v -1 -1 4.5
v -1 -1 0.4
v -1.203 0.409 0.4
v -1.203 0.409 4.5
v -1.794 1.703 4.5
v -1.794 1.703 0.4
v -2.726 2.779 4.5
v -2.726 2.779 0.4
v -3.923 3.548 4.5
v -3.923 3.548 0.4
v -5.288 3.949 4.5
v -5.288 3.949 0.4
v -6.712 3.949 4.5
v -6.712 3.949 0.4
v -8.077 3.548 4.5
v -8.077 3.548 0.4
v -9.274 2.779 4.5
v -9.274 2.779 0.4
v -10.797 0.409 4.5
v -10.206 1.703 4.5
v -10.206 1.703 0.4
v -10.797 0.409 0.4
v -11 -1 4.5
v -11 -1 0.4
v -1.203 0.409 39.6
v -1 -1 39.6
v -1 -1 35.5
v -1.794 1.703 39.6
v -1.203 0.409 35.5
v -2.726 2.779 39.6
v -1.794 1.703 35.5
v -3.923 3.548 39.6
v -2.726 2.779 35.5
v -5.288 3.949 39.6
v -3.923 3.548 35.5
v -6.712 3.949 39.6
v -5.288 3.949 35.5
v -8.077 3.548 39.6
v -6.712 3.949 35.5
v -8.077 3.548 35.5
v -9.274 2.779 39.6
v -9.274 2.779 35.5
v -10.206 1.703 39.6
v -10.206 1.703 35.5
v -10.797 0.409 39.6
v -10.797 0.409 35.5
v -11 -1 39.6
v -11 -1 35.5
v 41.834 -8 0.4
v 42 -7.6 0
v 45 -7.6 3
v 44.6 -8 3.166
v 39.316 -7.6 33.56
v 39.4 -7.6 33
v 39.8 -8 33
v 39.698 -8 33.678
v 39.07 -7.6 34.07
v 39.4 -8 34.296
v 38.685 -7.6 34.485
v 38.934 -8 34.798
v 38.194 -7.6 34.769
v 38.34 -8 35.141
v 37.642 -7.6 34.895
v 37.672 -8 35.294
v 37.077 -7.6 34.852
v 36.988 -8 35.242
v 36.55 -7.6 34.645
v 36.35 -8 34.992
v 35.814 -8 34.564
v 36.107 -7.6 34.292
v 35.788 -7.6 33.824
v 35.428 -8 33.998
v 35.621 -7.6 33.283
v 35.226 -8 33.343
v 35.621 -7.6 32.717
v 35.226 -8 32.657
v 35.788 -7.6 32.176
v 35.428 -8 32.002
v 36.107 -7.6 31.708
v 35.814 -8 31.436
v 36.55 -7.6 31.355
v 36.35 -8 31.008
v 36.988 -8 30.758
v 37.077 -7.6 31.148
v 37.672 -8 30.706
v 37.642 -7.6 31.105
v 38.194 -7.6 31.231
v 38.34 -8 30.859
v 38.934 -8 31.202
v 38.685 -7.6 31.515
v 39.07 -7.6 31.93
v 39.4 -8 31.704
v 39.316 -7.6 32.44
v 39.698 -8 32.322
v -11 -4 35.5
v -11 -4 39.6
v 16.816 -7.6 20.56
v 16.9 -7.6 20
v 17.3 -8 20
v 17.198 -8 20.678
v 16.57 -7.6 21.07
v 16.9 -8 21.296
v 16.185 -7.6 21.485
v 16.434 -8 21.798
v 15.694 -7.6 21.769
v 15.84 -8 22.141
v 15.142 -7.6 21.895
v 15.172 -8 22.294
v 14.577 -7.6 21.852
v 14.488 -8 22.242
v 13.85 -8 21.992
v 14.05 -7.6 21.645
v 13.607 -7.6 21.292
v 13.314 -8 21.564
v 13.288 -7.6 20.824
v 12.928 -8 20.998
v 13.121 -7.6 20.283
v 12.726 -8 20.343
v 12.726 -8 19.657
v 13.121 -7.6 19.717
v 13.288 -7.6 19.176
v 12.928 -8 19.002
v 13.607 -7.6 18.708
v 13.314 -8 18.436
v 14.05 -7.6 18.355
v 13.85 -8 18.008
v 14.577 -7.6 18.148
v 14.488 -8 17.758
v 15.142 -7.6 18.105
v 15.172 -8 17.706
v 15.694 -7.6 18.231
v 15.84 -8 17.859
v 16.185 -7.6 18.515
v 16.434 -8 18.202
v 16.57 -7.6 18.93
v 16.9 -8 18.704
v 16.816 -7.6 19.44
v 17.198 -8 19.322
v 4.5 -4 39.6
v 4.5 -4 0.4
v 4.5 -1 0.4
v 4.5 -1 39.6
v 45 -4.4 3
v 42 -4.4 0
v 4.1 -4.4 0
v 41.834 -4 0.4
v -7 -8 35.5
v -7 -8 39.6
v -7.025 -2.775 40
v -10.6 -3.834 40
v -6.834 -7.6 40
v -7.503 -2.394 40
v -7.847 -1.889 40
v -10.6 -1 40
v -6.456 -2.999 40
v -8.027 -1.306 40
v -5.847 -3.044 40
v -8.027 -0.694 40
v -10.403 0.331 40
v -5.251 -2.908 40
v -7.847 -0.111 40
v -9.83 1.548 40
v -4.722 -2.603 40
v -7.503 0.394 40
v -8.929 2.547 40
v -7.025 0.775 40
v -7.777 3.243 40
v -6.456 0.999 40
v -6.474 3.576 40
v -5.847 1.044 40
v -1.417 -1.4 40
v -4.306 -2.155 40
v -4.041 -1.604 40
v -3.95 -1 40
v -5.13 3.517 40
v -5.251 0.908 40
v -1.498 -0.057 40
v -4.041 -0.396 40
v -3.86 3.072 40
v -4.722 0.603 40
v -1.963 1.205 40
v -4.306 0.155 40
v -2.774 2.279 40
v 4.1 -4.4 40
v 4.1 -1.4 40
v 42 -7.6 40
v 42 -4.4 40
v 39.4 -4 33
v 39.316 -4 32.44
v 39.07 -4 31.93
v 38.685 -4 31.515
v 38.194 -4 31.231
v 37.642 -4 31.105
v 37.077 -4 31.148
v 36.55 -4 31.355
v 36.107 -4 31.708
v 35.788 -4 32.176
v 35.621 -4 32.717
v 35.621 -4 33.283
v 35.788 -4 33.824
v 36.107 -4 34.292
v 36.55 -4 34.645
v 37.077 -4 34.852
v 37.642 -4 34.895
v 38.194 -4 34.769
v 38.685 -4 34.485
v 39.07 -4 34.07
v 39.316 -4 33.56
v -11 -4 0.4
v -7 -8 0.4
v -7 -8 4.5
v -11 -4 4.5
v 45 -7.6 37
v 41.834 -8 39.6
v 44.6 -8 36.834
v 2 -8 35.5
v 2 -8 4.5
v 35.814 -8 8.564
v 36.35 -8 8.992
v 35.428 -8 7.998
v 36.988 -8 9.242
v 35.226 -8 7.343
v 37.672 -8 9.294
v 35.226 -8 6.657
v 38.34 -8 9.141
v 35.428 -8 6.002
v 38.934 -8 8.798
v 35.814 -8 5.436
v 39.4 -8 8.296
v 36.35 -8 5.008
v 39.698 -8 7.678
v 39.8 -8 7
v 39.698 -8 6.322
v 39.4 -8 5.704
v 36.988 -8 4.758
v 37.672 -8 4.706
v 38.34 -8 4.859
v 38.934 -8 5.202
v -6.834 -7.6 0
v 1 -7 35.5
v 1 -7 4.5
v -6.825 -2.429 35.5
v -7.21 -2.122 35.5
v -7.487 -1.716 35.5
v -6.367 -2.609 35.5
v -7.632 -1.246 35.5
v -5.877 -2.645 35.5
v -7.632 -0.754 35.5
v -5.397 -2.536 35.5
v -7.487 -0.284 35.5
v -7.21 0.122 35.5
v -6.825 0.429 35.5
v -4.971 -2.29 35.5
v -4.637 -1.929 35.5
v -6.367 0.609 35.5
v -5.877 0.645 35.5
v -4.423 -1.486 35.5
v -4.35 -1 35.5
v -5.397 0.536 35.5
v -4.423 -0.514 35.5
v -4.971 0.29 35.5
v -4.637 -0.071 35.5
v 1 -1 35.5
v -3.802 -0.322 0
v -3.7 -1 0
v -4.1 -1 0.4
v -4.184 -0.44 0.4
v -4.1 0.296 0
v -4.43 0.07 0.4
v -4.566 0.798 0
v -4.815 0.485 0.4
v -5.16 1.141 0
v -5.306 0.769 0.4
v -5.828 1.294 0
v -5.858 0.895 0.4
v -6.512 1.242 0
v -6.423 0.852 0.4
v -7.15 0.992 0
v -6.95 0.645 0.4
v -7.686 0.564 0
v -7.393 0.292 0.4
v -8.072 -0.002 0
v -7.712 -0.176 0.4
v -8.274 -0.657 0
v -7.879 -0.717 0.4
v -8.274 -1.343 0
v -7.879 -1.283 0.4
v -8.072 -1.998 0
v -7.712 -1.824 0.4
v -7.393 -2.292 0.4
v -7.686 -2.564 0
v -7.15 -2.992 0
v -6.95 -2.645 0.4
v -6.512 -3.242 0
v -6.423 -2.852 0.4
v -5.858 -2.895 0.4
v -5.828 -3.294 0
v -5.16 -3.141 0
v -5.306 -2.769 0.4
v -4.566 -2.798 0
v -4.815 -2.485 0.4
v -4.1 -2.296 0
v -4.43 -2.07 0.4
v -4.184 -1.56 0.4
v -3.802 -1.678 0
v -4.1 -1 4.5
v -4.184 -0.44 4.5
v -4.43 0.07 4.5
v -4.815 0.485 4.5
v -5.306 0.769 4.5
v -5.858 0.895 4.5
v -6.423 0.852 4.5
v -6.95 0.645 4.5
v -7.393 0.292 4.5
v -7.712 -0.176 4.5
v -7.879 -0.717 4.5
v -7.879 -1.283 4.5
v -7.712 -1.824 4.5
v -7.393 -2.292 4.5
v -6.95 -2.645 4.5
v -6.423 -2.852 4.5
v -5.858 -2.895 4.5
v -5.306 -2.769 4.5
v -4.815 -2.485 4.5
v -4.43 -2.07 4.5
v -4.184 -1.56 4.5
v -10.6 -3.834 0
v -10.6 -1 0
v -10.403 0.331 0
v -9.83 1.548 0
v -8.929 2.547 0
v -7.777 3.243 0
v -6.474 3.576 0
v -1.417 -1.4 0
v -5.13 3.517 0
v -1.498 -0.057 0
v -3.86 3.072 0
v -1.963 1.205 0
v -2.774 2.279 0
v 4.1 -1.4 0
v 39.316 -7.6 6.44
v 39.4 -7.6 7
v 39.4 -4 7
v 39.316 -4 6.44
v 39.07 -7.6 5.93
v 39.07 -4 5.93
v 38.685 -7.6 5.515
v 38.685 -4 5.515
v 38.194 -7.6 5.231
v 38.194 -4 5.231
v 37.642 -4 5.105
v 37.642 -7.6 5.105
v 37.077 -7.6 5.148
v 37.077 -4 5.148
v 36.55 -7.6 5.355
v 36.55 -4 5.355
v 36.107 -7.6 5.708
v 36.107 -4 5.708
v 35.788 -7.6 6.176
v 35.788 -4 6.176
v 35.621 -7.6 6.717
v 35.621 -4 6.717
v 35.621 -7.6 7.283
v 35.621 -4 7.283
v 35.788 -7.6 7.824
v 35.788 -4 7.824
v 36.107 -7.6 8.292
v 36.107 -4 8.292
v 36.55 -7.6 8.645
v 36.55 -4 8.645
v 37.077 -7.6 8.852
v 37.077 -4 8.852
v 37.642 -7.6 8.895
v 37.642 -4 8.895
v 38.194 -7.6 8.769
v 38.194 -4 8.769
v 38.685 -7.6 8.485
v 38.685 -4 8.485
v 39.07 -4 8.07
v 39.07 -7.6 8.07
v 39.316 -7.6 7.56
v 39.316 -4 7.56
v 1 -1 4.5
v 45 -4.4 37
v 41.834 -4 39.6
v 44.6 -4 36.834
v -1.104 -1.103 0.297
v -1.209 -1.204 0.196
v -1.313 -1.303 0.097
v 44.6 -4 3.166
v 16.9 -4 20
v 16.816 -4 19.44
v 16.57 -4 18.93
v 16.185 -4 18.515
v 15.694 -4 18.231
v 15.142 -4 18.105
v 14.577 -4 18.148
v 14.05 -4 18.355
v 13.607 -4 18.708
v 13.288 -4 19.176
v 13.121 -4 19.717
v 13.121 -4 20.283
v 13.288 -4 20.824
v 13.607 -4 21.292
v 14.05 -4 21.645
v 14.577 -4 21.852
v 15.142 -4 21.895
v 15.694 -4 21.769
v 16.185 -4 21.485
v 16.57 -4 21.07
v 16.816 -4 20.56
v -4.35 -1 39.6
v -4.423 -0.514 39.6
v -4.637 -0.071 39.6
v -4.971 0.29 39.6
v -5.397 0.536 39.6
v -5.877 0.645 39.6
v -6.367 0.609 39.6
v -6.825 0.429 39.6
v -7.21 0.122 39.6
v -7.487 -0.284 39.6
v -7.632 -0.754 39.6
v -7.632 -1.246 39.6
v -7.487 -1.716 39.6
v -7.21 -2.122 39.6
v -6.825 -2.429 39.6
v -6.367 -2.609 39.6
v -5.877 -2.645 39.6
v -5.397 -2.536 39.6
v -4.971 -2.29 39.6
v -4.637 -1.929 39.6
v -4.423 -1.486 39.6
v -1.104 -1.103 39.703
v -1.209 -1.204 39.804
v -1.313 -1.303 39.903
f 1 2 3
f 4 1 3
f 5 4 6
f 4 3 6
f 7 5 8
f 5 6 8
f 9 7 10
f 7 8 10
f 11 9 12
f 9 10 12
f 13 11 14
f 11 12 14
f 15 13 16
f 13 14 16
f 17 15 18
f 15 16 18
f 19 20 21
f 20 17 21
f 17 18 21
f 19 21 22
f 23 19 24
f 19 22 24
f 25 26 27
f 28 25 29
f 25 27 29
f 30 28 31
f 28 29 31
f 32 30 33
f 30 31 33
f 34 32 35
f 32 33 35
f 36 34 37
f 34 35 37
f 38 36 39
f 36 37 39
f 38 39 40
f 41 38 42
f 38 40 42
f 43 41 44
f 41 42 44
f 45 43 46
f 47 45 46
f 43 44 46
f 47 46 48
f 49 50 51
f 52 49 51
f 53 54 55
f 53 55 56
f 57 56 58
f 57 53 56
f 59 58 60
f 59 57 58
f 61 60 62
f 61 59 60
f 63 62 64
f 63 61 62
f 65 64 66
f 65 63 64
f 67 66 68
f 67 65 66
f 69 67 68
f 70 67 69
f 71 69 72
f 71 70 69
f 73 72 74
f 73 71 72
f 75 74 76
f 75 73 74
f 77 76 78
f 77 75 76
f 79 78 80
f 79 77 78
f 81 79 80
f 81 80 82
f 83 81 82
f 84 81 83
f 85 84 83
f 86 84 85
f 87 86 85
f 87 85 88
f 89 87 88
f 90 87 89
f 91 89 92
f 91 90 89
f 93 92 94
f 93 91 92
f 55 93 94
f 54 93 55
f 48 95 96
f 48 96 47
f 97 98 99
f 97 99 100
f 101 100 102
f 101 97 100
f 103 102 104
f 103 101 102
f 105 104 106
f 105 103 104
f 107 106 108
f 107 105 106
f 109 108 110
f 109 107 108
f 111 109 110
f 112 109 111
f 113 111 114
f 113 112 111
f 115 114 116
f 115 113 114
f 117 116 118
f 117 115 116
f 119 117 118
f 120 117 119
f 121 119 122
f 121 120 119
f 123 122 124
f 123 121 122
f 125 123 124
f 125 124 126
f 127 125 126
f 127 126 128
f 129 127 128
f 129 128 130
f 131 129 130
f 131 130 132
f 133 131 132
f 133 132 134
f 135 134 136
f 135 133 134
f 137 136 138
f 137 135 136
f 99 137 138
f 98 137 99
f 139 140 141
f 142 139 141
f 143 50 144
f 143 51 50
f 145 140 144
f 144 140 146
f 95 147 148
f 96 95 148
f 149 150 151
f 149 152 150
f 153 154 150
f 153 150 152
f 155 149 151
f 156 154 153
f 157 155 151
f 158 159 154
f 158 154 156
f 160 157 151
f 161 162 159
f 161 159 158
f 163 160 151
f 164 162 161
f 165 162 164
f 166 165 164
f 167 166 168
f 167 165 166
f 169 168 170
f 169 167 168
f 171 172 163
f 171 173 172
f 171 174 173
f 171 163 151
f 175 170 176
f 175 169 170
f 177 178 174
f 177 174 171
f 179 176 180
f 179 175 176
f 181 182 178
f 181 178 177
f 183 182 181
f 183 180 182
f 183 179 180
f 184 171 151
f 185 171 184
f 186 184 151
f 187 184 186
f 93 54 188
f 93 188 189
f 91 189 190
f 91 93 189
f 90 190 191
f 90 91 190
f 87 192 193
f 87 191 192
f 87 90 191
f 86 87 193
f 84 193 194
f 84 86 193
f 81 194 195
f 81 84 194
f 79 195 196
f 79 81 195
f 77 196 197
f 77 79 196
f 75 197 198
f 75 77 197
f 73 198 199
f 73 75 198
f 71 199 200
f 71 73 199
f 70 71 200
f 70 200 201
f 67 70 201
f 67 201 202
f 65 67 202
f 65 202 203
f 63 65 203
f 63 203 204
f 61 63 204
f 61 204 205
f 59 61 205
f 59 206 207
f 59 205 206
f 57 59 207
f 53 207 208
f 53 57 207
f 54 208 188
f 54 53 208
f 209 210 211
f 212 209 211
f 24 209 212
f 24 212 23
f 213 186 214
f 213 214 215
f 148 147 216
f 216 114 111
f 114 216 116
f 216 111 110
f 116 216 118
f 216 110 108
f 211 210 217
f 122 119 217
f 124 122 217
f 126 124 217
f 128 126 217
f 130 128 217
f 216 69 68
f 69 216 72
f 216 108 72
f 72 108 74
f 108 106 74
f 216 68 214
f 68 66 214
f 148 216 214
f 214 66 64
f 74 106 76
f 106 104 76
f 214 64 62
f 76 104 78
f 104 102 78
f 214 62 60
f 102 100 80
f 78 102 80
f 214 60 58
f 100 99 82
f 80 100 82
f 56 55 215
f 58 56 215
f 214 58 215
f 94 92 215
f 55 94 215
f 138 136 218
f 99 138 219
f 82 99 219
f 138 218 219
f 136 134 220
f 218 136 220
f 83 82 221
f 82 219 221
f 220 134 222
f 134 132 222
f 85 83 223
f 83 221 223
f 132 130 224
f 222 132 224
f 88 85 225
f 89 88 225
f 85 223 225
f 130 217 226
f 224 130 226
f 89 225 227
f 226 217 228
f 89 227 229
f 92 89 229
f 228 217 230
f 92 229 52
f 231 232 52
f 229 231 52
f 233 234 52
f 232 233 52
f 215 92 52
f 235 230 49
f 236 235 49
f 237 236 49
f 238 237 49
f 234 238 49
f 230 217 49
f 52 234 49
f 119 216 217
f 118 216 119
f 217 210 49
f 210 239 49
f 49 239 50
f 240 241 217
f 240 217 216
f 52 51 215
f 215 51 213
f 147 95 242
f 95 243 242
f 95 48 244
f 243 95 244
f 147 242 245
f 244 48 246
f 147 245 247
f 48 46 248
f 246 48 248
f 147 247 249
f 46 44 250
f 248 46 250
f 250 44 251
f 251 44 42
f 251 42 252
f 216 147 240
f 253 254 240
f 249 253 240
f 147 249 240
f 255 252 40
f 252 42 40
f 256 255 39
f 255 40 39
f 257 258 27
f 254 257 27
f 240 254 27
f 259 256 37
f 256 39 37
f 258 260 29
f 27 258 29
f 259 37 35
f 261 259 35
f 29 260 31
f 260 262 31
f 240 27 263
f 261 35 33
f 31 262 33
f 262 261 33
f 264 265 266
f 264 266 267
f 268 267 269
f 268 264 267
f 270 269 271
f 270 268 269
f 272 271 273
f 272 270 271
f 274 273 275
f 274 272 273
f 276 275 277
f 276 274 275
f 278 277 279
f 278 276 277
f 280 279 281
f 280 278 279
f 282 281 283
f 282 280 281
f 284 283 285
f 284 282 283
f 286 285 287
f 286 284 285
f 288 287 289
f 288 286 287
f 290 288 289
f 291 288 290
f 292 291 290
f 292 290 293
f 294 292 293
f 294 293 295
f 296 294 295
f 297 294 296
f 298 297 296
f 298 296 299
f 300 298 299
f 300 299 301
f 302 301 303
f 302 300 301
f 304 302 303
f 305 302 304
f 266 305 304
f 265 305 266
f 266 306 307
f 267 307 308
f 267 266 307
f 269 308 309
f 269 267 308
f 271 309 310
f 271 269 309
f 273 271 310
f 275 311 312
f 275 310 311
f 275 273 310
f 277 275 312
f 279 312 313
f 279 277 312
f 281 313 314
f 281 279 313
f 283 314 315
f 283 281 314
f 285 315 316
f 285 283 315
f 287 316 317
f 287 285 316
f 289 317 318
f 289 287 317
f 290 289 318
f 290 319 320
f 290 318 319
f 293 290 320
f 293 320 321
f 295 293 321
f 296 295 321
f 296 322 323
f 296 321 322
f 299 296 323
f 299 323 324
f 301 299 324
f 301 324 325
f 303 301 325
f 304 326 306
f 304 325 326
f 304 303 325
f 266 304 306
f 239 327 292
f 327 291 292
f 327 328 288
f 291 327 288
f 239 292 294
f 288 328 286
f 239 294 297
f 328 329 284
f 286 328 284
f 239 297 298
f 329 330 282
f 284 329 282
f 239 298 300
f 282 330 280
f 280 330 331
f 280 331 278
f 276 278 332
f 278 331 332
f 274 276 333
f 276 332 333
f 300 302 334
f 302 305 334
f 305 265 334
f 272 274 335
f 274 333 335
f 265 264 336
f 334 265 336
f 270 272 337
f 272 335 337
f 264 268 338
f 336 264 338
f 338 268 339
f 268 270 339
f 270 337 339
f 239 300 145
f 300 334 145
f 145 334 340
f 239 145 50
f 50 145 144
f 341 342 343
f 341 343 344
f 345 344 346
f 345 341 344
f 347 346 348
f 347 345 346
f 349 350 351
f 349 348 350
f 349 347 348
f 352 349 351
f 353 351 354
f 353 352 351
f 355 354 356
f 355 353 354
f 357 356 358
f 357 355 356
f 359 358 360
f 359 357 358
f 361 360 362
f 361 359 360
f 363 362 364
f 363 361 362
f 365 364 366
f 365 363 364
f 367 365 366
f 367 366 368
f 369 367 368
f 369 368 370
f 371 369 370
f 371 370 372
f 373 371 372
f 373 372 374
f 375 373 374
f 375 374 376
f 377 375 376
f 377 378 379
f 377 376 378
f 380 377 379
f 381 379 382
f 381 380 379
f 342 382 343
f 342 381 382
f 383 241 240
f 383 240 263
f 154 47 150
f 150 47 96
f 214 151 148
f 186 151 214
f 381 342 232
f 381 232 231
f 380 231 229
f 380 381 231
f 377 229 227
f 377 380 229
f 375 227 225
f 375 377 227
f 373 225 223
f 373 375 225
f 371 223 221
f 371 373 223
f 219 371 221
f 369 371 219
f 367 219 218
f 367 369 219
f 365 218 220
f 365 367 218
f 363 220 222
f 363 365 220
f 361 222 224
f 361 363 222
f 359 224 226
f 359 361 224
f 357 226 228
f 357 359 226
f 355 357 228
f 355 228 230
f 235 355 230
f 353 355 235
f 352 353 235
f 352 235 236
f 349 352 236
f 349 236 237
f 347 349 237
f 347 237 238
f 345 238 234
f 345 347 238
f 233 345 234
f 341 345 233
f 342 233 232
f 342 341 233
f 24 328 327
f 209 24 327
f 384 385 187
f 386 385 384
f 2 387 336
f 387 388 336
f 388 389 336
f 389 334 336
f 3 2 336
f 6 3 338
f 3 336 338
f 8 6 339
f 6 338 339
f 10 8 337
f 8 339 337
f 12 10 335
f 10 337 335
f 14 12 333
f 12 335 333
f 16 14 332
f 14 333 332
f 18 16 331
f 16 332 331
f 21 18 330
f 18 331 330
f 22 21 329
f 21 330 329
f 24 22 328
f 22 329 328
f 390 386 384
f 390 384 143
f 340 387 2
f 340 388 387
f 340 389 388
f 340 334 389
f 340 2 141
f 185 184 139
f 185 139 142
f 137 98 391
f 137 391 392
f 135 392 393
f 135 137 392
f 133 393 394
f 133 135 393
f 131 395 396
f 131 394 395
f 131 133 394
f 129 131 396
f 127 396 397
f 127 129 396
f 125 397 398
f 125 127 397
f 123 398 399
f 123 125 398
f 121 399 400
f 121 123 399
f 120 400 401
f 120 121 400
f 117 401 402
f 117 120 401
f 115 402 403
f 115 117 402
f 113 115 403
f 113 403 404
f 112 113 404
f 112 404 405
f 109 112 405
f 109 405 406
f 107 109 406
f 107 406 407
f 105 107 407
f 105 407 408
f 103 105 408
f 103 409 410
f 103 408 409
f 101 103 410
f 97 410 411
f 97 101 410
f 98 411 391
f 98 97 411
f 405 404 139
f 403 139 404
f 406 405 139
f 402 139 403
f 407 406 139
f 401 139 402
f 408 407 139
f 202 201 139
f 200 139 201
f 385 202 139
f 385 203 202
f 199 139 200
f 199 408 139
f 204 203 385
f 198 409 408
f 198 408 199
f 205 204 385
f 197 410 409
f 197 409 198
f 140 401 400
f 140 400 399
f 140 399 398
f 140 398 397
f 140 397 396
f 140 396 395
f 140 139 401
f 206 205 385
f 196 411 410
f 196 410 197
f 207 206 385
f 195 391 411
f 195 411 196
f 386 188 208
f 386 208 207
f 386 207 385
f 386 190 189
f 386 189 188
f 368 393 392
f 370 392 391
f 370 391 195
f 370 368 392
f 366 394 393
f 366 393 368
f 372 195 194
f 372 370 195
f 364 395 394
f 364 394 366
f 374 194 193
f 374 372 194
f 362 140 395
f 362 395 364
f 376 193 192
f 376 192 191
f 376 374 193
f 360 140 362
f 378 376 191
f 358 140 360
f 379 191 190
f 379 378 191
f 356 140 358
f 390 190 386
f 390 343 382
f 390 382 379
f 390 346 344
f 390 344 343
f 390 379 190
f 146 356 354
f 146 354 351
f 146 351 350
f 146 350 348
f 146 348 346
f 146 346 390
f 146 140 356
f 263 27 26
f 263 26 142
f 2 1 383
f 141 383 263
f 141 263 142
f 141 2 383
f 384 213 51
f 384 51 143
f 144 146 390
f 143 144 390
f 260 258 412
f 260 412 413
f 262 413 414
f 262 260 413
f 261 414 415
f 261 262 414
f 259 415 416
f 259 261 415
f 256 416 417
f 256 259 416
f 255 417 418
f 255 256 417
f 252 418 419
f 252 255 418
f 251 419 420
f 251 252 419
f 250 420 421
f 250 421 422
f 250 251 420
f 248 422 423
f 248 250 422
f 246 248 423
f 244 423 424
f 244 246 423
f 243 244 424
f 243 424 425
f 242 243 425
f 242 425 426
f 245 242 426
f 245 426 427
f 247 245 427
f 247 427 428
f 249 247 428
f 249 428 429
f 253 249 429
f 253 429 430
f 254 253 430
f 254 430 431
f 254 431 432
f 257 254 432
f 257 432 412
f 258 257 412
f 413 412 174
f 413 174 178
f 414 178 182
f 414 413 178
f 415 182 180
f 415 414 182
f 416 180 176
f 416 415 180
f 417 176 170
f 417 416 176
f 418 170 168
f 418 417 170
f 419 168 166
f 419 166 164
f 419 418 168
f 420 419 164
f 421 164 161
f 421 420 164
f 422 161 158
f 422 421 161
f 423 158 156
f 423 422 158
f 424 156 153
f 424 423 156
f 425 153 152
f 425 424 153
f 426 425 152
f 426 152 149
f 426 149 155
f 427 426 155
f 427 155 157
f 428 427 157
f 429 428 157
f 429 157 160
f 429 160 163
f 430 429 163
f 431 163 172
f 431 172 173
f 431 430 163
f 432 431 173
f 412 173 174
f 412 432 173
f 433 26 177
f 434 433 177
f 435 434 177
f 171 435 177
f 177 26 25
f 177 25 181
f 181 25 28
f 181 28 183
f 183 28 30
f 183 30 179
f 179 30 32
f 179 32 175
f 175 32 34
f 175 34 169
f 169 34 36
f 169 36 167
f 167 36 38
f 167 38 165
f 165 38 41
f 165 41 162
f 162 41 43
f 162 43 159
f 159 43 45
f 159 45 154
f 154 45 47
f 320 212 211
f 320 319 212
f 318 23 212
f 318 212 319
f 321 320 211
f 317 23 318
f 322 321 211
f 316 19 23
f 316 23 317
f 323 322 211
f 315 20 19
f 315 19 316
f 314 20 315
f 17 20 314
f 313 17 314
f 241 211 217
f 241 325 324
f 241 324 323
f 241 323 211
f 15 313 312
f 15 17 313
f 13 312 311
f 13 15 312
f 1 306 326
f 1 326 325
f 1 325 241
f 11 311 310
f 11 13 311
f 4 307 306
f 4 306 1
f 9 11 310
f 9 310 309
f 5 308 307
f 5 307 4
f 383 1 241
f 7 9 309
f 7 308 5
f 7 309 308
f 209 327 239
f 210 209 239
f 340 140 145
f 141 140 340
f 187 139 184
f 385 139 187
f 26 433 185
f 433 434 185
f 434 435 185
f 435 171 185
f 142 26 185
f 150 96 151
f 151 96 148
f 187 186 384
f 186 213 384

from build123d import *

# Parameters (mm, degrees)
CYLINDER008_R         = 1.9
CYLINDER008_DEPTH     = 10
CYLINDER007_R         = 1.9
CYLINDER007_DEPTH     = 10
CYLINDER009_R         = 1.9
CYLINDER009_DEPTH     = 10
CYLINDER006_R         = 1.9
CYLINDER006_DEPTH     = 10
CYLINDER010_R         = 1.65
CYLINDER010_DEPTH     = 10
BOX025_W              = 13
BOX025_H              = 14
BOX025_DEPTH          = 31
CYLINDER004_R         = 5
CYLINDER004_DEPTH     = 40
BOX023_W              = 46
BOX023_H              = 4
BOX023_DEPTH          = 40
BOX024_W              = 56
BOX024_H              = 7
BOX024_DEPTH          = 40
CHAMFER006006007_SIZE = 4
CHAMFER006006008_SIZE = 3
CHAMFER006006009_SIZE = 1
CHAMFER006006010_SIZE = 0.4


with BuildPart() as cylinder008:
    # Cylinder008 → Cylinder008 (new body)
    with BuildSketch(Plane(origin=(37.5, -9, 33), x_dir=(1, 0, 0), z_dir=(0, 1, 0))):
        Circle(CYLINDER008_R)
    extrude(amount=CYLINDER008_DEPTH)


with BuildPart() as cylinder007:
    # Cylinder007 → Cylinder007 (new body)
    with BuildSketch(Plane(origin=(15, -9, 20), x_dir=(1, 0, 0), z_dir=(0, 1, 0))):
        Circle(CYLINDER007_R)
    extrude(amount=CYLINDER007_DEPTH)


with BuildPart() as fusion002:
    # Cylinder009 → Cylinder009 (new body)
    with BuildSketch(Plane(origin=(37.5, -9, 7), x_dir=(1, 0, 0), z_dir=(0, 1, 0))):
        Circle(CYLINDER009_R)
    extrude(amount=CYLINDER009_DEPTH)

    # Fusion002: union Cylinder008, Cylinder007
    add(cylinder008.part)
    add(cylinder007.part)


with BuildPart() as cylinder006:
    # Cylinder006 → Cylinder006 (new body)
    with BuildSketch(Plane(origin=(-6, -1, 0), x_dir=(1, 0, 0), z_dir=(0, 0, 1))):
        Circle(CYLINDER006_R)
    extrude(amount=CYLINDER006_DEPTH)


with BuildPart() as fusion004:
    # Cylinder010 → Cylinder010 (new body)
    with BuildSketch(Plane(origin=(-6, -1, 30), x_dir=(1, 0, 0), z_dir=(0, 0, 1))):
        Circle(CYLINDER010_R)
    extrude(amount=CYLINDER010_DEPTH)

    # Fusion003: union Cylinder006
    add(cylinder006.part)

    # Fusion004: union Fusion002
    add(fusion002.part)


with BuildPart() as cube024:
    # Box025 → Box025 (new body)
    with BuildSketch(Plane(origin=(-12, -9, 4.5), x_dir=(1, 0, 0), z_dir=(0, 0, 1))):
        with Locations((6.5, 7)):
            Rectangle(BOX025_W, BOX025_H)
    extrude(amount=BOX025_DEPTH)


with BuildPart() as cylinder004:
    # Cylinder004 → Cylinder004 (new body)
    with BuildSketch(Plane(origin=(-6, -1, 0), x_dir=(1, 0, 0), z_dir=(0, 0, 1))):
        Circle(CYLINDER004_R)
    extrude(amount=CYLINDER004_DEPTH)


with BuildPart() as cube022:
    # Box023 → Box023 (new body)
    with BuildSketch(Plane(origin=(4.5, -4, 0), x_dir=(1, 0, 0), z_dir=(0, 0, 1))):
        with Locations((23, 2)):
            Rectangle(BOX023_W, BOX023_H)
    extrude(amount=BOX023_DEPTH)


with BuildPart() as chamfer006006010:
    # Box024 → Box024 (new body)
    with BuildSketch(Plane(origin=(-11, -8, 0), x_dir=(1, 0, 0), z_dir=(0, 0, 1))):
        with Locations((28, 3.5)):
            Rectangle(BOX024_W, BOX024_H)
    extrude(amount=BOX024_DEPTH)

    # Chamfer006006007
    chamfer006006007_edges = [chamfer006006010.edges().sort_by_distance(p)[0] for p in [
        (-11, -8, 20),
    ]]
    chamfer(chamfer006006007_edges, length=CHAMFER006006007_SIZE)

    # Cut002002: cut Cube022
    add(cube022.part, mode=Mode.SUBTRACT)

    # Chamfer006006008
    chamfer006006008_edges = [chamfer006006010.edges().sort_by_distance(p)[0] for p in [
        (45, -6, 40),
        (45, -6, 0),
    ]]
    chamfer(chamfer006006008_edges, length=CHAMFER006006008_SIZE)

    # Fusion001: union Cylinder004
    add(cylinder004.part)

    # Cut002003: cut Cube024
    add(cube024.part, mode=Mode.SUBTRACT)

    # Chamfer006006009
    chamfer006006009_edges = [chamfer006006010.edges().sort_by_distance(p)[0] for p in [
        (1, -8, 20),
    ]]
    chamfer(chamfer006006009_edges, length=CHAMFER006006009_SIZE)

    # Cut002004: cut Fusion004
    add(fusion004.part, mode=Mode.SUBTRACT)

    # Chamfer006006010
    chamfer006006010_edges = [chamfer006006010.edges().sort_by_distance(p)[0] for p in [
        (17.5, -8, 40),
        (43.5, -8, 38.5),
        (45, -8, 20),
        (17.5, -8, 0),
        (43.5, -8, 1.5),
        (13.1, -8, 20),
        (35.6, -8, 7),
        (35.6, -8, 33),
        (-9, -6, 40),
        (43.5, -4, 38.5),
        (-9, -6, 0),
        (45, -4, 20),
        (43.5, -4, 1.5),
        (1.75, -1, 0),
        (1.75, -1, 40),
        (-6, 4, 40),
        (-11, -2.5, 40),
        (-6, 0.65, 40),
        (-6, -2.65, 40),
        (-6, 4, 0),
        (-11, -2.5, 0),
        (-6, -2.9, 0),
        (-6, 0.9, 0),
        (4.5, -2.5, 40),
        (4.5, -2.5, 0),
        (23.25, -4, 0),
        (23.25, -4, 40),
    ]]
    chamfer(chamfer006006010_edges, length=CHAMFER006006010_SIZE)


solid = chamfer006006010.part
